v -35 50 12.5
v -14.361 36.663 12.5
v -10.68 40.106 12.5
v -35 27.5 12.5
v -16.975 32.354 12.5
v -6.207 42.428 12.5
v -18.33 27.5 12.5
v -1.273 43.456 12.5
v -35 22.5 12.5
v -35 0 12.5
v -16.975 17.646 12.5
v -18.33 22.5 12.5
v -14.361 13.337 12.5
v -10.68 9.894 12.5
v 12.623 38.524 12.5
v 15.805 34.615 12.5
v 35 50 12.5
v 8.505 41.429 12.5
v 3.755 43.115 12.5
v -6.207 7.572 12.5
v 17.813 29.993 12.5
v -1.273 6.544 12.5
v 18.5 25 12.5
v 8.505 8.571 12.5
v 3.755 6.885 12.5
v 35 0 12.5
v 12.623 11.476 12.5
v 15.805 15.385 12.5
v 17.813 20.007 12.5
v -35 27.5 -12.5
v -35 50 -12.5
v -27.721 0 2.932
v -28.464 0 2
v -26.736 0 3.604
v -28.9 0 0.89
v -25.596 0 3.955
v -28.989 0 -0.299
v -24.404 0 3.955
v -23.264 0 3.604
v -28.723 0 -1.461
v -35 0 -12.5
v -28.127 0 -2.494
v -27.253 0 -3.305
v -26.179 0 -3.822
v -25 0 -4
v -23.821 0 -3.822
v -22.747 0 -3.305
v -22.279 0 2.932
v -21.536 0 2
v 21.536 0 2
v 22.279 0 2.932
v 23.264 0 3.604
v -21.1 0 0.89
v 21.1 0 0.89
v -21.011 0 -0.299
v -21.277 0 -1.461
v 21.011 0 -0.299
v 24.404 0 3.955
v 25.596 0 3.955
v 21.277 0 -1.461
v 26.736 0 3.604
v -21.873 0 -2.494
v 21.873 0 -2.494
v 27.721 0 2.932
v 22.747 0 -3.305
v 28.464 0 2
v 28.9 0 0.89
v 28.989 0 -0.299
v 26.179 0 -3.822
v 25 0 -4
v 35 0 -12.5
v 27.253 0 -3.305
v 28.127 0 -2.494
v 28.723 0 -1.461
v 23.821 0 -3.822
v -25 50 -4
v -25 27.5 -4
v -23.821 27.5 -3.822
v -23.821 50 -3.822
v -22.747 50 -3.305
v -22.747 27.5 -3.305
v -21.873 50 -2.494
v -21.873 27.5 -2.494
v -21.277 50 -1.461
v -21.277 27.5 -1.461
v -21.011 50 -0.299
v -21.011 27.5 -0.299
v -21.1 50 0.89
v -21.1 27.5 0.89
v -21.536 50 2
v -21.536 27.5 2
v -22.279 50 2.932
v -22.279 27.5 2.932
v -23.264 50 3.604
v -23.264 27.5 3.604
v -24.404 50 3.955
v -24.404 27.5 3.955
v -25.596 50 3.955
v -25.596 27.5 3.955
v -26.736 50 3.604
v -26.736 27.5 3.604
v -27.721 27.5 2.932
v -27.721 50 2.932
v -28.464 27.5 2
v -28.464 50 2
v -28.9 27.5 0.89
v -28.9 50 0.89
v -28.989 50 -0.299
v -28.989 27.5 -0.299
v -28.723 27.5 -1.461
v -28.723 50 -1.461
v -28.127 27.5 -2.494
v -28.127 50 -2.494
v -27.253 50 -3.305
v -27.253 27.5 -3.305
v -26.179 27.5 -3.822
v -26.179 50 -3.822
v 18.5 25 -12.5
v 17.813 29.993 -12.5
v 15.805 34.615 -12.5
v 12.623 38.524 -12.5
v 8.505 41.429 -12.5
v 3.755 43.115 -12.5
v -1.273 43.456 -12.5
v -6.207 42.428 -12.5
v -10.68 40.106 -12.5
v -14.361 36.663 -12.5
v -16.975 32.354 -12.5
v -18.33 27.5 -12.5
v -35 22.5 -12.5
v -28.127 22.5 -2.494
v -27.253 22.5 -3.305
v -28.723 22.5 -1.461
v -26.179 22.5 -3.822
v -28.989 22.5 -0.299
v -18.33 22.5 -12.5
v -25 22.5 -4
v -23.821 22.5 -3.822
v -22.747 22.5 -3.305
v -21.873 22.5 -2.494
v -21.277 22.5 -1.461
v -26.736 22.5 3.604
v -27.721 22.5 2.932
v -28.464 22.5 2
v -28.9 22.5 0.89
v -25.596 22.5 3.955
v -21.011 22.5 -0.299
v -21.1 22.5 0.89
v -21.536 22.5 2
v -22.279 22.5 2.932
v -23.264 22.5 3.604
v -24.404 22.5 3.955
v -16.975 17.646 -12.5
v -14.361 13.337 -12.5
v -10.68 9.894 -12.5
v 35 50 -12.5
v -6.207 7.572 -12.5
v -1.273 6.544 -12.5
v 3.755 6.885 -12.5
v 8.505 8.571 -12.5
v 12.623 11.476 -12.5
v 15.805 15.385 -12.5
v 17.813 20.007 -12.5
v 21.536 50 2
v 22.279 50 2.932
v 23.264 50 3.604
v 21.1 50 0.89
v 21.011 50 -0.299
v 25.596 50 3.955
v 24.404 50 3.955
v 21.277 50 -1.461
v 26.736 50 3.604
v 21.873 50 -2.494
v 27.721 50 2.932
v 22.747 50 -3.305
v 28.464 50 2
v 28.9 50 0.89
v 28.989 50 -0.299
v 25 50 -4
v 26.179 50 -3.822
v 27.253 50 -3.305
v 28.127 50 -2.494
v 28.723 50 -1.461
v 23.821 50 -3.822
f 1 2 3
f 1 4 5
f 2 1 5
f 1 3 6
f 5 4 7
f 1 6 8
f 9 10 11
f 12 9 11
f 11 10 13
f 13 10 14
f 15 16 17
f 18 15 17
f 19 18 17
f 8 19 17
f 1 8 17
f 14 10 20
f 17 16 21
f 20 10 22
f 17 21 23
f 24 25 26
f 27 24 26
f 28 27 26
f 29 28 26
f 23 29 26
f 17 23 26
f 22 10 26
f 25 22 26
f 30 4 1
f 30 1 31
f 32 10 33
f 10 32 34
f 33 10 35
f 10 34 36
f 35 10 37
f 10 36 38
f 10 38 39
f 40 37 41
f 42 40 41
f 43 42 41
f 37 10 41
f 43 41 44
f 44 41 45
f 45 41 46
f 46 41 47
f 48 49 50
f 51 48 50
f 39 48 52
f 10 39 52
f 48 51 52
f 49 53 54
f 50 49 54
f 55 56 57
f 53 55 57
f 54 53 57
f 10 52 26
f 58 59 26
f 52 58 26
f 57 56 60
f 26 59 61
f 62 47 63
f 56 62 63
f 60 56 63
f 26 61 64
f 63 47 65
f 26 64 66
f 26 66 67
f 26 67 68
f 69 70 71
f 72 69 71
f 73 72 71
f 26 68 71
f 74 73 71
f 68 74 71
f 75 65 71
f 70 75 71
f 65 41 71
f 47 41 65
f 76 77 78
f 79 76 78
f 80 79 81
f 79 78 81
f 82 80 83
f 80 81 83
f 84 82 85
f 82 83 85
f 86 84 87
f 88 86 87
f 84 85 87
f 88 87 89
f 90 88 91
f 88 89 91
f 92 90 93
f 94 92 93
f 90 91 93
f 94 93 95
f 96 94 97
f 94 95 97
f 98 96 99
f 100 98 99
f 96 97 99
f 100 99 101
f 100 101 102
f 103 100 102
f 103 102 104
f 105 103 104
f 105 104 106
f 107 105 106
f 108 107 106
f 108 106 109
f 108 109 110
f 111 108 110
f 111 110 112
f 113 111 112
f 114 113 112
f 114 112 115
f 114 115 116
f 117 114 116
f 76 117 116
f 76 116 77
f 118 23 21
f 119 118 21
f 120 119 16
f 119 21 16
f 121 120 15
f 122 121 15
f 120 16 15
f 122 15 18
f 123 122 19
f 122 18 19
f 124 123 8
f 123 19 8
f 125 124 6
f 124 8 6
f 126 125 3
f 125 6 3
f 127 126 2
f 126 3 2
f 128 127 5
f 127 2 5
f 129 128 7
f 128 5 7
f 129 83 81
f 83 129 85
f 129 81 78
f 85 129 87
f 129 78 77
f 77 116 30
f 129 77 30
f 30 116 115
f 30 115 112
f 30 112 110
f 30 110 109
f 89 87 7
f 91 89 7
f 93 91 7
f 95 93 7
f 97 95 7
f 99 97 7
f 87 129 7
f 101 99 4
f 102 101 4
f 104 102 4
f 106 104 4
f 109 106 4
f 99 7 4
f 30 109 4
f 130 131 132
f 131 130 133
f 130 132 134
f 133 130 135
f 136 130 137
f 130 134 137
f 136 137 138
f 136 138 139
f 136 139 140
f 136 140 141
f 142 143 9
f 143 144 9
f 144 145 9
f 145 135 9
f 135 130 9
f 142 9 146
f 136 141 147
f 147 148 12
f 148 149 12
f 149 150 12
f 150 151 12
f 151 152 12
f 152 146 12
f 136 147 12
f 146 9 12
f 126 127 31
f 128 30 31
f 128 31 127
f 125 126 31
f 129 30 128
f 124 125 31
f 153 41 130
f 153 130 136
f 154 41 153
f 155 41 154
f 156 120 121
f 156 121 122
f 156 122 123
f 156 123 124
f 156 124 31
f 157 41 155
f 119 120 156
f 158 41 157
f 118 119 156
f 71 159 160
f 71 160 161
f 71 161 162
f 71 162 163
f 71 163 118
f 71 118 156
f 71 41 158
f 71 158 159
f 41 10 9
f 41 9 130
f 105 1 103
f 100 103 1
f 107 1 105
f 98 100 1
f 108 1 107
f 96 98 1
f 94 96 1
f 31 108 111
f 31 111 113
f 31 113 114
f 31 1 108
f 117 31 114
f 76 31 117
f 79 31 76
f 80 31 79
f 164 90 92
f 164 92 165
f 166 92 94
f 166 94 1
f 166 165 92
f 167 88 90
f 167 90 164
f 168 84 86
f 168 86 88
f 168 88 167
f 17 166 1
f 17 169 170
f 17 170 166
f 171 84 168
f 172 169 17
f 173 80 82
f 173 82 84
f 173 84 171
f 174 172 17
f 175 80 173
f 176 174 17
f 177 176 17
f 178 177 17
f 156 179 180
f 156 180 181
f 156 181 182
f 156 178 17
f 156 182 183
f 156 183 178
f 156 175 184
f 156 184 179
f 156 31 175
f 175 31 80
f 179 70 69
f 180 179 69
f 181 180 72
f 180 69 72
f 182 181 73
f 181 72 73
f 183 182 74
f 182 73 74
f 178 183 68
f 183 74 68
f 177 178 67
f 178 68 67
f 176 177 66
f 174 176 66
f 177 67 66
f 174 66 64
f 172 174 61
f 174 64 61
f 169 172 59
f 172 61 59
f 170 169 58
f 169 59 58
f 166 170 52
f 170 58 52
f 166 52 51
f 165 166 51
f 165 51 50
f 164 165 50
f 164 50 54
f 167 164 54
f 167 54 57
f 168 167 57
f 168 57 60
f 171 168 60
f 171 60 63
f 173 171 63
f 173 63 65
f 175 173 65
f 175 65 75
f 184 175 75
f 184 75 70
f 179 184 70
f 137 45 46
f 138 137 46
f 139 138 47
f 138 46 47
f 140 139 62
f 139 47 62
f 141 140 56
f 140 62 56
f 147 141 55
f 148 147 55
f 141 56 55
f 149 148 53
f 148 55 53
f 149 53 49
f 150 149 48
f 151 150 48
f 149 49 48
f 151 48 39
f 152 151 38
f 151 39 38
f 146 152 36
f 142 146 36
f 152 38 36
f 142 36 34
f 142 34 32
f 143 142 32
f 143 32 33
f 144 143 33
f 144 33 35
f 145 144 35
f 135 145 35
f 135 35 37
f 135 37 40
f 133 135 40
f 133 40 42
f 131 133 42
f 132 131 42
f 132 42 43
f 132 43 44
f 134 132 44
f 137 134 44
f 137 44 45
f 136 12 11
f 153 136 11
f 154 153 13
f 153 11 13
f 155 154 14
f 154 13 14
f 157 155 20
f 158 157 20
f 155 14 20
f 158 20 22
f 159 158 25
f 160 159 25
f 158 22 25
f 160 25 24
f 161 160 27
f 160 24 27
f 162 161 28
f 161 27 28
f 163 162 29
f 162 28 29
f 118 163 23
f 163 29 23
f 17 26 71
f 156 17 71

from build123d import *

# Parameters (mm, degrees)
SKIZZE1_W                       = 70
SKIZZE1_H                       = 25
AUFSATZ_LINEAR_AUSTRAGEN1_DEPTH = 50
SCHNITT_LINEAR_AUSTRAGEN1_DEPTH = 50
SKIZZE3_R                       = 4
SCHNITT_LINEAR_AUSTRAGEN2_DEPTH = 63.299678972


with BuildPart() as part:
    # Skizze1 → Aufsatz-Linear austragen1 (new body)
    with BuildSketch(Plane(origin=(0, 0, 0), x_dir=(1, 0, 0), z_dir=(0, 1, 0))):
        Rectangle(SKIZZE1_W, SKIZZE1_H)
    extrude(amount=AUFSATZ_LINEAR_AUSTRAGEN1_DEPTH)

    # Skizze2 → Schnitt-Linear austragen1 (cut)
    with BuildSketch(Plane.XY.offset(12.5)):
        with BuildLine():
            ThreePointArc((18.5, 25), (1.252876405, 43.457526939), (-18.33030278, 27.5))
            Line((-18.33030278, 27.5), (0, 27.5))
            Line((0, 27.5), (0, 22.5))
            Line((0, 22.5), (-18.33030278, 22.5))
            ThreePointArc((-18.33030278, 22.5), (1.252876405, 6.542473061), (18.5, 25))
        make_face()
        with BuildLine():
            Line((0, 27.5), (-18.33030278, 27.5))
            ThreePointArc((-18.33030278, 27.5), (-18.5, 25), (-18.33030278, 22.5))
            Line((-18.33030278, 22.5), (0, 22.5))
            Line((0, 22.5), (0, 27.5))
        make_face()
        with BuildLine():
            Line((-18.33030278, 27.5), (-35, 27.5))
            Line((-35, 27.5), (-35, 22.5))
            Line((-35, 22.5), (-18.33030278, 22.5))
            ThreePointArc((-18.33030278, 22.5), (-18.5, 25), (-18.33030278, 27.5))
        make_face()
    extrude(amount=-SCHNITT_LINEAR_AUSTRAGEN1_DEPTH, mode=Mode.SUBTRACT)

    # Skizze3 → Schnitt-Linear austragen2 (cut, through all)
    with BuildSketch(Plane.XZ):
        with Locations(Location((-25, 0, 0), (0, 0, 270))):
            Circle(SKIZZE3_R)
        with Locations(Location((25, 0, 0), (0, 0, 270))):
            Circle(SKIZZE3_R)
    extrude(amount=-SCHNITT_LINEAR_AUSTRAGEN2_DEPTH, mode=Mode.SUBTRACT)


solid = part.part
